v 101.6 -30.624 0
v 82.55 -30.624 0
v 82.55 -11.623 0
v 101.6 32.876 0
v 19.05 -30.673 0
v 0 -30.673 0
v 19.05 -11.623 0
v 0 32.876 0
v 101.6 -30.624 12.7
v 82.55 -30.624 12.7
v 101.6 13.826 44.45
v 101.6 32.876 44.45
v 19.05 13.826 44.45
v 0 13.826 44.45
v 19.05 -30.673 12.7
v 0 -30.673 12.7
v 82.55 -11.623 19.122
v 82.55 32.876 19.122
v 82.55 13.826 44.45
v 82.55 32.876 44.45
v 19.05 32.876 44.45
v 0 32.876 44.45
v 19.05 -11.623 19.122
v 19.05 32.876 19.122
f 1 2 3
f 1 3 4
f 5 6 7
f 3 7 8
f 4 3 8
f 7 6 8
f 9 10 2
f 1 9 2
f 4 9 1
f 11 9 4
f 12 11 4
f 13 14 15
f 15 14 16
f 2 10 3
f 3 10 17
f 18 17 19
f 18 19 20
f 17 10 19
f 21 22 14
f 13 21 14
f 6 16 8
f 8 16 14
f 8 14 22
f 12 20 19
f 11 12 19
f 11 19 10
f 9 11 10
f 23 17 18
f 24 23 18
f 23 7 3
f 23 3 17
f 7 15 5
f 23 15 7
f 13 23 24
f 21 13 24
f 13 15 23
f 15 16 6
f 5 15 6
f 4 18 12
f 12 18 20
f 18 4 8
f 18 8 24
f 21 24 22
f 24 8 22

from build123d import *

# Parameters (mm, degrees)
F1_DEPTH = 19.05
F2_W     = 44.4994677836
F2_H     = 19.1223323345
F3_DEPTH = 63.5
F5_DEPTH = 19.05
F6_DEPTH = 19.05


with BuildPart() as f1:
    # F0 (on Right) → F1 (new body)
    with BuildSketch(Plane.YZ):
        Polygon((-30.6730988776, 12.7), (-30.6730988776, 0), (32.876368906, 0), (32.876368906, 44.45), (13.826368906, 44.45), align=None)
    extrude(amount=F1_DEPTH)

    # F2 (on face) → F3 (join)
    with BuildSketch(Plane.YZ.offset(19.05)):
        with Locations((10.6266350142, 9.5611661673)):
            Rectangle(F2_W, F2_H)
    extrude(amount=F3_DEPTH)

    # F4 (on face) → F5 (join)
    with BuildSketch(Plane.YZ.offset(82.55)):
        Polygon((-11.6230988776, 19.1223323345), (32.876368906, 19.1223323345), (32.876368906, 44.45), (13.826368906, 44.45), (-30.623631094, 12.7), (-30.623631094, 0), (-11.6230988776, 0), align=None)
    extrude(amount=F5_DEPTH)

    # F6 (add, through all): a face of the model
    f6_faces = [f1.faces().sort_by_distance(p)[0] for p in [
        (82.55, 10.6266350142, 9.5611661673),
    ]]
    extrude(f6_faces, amount=F6_DEPTH)


solid = f1.part
